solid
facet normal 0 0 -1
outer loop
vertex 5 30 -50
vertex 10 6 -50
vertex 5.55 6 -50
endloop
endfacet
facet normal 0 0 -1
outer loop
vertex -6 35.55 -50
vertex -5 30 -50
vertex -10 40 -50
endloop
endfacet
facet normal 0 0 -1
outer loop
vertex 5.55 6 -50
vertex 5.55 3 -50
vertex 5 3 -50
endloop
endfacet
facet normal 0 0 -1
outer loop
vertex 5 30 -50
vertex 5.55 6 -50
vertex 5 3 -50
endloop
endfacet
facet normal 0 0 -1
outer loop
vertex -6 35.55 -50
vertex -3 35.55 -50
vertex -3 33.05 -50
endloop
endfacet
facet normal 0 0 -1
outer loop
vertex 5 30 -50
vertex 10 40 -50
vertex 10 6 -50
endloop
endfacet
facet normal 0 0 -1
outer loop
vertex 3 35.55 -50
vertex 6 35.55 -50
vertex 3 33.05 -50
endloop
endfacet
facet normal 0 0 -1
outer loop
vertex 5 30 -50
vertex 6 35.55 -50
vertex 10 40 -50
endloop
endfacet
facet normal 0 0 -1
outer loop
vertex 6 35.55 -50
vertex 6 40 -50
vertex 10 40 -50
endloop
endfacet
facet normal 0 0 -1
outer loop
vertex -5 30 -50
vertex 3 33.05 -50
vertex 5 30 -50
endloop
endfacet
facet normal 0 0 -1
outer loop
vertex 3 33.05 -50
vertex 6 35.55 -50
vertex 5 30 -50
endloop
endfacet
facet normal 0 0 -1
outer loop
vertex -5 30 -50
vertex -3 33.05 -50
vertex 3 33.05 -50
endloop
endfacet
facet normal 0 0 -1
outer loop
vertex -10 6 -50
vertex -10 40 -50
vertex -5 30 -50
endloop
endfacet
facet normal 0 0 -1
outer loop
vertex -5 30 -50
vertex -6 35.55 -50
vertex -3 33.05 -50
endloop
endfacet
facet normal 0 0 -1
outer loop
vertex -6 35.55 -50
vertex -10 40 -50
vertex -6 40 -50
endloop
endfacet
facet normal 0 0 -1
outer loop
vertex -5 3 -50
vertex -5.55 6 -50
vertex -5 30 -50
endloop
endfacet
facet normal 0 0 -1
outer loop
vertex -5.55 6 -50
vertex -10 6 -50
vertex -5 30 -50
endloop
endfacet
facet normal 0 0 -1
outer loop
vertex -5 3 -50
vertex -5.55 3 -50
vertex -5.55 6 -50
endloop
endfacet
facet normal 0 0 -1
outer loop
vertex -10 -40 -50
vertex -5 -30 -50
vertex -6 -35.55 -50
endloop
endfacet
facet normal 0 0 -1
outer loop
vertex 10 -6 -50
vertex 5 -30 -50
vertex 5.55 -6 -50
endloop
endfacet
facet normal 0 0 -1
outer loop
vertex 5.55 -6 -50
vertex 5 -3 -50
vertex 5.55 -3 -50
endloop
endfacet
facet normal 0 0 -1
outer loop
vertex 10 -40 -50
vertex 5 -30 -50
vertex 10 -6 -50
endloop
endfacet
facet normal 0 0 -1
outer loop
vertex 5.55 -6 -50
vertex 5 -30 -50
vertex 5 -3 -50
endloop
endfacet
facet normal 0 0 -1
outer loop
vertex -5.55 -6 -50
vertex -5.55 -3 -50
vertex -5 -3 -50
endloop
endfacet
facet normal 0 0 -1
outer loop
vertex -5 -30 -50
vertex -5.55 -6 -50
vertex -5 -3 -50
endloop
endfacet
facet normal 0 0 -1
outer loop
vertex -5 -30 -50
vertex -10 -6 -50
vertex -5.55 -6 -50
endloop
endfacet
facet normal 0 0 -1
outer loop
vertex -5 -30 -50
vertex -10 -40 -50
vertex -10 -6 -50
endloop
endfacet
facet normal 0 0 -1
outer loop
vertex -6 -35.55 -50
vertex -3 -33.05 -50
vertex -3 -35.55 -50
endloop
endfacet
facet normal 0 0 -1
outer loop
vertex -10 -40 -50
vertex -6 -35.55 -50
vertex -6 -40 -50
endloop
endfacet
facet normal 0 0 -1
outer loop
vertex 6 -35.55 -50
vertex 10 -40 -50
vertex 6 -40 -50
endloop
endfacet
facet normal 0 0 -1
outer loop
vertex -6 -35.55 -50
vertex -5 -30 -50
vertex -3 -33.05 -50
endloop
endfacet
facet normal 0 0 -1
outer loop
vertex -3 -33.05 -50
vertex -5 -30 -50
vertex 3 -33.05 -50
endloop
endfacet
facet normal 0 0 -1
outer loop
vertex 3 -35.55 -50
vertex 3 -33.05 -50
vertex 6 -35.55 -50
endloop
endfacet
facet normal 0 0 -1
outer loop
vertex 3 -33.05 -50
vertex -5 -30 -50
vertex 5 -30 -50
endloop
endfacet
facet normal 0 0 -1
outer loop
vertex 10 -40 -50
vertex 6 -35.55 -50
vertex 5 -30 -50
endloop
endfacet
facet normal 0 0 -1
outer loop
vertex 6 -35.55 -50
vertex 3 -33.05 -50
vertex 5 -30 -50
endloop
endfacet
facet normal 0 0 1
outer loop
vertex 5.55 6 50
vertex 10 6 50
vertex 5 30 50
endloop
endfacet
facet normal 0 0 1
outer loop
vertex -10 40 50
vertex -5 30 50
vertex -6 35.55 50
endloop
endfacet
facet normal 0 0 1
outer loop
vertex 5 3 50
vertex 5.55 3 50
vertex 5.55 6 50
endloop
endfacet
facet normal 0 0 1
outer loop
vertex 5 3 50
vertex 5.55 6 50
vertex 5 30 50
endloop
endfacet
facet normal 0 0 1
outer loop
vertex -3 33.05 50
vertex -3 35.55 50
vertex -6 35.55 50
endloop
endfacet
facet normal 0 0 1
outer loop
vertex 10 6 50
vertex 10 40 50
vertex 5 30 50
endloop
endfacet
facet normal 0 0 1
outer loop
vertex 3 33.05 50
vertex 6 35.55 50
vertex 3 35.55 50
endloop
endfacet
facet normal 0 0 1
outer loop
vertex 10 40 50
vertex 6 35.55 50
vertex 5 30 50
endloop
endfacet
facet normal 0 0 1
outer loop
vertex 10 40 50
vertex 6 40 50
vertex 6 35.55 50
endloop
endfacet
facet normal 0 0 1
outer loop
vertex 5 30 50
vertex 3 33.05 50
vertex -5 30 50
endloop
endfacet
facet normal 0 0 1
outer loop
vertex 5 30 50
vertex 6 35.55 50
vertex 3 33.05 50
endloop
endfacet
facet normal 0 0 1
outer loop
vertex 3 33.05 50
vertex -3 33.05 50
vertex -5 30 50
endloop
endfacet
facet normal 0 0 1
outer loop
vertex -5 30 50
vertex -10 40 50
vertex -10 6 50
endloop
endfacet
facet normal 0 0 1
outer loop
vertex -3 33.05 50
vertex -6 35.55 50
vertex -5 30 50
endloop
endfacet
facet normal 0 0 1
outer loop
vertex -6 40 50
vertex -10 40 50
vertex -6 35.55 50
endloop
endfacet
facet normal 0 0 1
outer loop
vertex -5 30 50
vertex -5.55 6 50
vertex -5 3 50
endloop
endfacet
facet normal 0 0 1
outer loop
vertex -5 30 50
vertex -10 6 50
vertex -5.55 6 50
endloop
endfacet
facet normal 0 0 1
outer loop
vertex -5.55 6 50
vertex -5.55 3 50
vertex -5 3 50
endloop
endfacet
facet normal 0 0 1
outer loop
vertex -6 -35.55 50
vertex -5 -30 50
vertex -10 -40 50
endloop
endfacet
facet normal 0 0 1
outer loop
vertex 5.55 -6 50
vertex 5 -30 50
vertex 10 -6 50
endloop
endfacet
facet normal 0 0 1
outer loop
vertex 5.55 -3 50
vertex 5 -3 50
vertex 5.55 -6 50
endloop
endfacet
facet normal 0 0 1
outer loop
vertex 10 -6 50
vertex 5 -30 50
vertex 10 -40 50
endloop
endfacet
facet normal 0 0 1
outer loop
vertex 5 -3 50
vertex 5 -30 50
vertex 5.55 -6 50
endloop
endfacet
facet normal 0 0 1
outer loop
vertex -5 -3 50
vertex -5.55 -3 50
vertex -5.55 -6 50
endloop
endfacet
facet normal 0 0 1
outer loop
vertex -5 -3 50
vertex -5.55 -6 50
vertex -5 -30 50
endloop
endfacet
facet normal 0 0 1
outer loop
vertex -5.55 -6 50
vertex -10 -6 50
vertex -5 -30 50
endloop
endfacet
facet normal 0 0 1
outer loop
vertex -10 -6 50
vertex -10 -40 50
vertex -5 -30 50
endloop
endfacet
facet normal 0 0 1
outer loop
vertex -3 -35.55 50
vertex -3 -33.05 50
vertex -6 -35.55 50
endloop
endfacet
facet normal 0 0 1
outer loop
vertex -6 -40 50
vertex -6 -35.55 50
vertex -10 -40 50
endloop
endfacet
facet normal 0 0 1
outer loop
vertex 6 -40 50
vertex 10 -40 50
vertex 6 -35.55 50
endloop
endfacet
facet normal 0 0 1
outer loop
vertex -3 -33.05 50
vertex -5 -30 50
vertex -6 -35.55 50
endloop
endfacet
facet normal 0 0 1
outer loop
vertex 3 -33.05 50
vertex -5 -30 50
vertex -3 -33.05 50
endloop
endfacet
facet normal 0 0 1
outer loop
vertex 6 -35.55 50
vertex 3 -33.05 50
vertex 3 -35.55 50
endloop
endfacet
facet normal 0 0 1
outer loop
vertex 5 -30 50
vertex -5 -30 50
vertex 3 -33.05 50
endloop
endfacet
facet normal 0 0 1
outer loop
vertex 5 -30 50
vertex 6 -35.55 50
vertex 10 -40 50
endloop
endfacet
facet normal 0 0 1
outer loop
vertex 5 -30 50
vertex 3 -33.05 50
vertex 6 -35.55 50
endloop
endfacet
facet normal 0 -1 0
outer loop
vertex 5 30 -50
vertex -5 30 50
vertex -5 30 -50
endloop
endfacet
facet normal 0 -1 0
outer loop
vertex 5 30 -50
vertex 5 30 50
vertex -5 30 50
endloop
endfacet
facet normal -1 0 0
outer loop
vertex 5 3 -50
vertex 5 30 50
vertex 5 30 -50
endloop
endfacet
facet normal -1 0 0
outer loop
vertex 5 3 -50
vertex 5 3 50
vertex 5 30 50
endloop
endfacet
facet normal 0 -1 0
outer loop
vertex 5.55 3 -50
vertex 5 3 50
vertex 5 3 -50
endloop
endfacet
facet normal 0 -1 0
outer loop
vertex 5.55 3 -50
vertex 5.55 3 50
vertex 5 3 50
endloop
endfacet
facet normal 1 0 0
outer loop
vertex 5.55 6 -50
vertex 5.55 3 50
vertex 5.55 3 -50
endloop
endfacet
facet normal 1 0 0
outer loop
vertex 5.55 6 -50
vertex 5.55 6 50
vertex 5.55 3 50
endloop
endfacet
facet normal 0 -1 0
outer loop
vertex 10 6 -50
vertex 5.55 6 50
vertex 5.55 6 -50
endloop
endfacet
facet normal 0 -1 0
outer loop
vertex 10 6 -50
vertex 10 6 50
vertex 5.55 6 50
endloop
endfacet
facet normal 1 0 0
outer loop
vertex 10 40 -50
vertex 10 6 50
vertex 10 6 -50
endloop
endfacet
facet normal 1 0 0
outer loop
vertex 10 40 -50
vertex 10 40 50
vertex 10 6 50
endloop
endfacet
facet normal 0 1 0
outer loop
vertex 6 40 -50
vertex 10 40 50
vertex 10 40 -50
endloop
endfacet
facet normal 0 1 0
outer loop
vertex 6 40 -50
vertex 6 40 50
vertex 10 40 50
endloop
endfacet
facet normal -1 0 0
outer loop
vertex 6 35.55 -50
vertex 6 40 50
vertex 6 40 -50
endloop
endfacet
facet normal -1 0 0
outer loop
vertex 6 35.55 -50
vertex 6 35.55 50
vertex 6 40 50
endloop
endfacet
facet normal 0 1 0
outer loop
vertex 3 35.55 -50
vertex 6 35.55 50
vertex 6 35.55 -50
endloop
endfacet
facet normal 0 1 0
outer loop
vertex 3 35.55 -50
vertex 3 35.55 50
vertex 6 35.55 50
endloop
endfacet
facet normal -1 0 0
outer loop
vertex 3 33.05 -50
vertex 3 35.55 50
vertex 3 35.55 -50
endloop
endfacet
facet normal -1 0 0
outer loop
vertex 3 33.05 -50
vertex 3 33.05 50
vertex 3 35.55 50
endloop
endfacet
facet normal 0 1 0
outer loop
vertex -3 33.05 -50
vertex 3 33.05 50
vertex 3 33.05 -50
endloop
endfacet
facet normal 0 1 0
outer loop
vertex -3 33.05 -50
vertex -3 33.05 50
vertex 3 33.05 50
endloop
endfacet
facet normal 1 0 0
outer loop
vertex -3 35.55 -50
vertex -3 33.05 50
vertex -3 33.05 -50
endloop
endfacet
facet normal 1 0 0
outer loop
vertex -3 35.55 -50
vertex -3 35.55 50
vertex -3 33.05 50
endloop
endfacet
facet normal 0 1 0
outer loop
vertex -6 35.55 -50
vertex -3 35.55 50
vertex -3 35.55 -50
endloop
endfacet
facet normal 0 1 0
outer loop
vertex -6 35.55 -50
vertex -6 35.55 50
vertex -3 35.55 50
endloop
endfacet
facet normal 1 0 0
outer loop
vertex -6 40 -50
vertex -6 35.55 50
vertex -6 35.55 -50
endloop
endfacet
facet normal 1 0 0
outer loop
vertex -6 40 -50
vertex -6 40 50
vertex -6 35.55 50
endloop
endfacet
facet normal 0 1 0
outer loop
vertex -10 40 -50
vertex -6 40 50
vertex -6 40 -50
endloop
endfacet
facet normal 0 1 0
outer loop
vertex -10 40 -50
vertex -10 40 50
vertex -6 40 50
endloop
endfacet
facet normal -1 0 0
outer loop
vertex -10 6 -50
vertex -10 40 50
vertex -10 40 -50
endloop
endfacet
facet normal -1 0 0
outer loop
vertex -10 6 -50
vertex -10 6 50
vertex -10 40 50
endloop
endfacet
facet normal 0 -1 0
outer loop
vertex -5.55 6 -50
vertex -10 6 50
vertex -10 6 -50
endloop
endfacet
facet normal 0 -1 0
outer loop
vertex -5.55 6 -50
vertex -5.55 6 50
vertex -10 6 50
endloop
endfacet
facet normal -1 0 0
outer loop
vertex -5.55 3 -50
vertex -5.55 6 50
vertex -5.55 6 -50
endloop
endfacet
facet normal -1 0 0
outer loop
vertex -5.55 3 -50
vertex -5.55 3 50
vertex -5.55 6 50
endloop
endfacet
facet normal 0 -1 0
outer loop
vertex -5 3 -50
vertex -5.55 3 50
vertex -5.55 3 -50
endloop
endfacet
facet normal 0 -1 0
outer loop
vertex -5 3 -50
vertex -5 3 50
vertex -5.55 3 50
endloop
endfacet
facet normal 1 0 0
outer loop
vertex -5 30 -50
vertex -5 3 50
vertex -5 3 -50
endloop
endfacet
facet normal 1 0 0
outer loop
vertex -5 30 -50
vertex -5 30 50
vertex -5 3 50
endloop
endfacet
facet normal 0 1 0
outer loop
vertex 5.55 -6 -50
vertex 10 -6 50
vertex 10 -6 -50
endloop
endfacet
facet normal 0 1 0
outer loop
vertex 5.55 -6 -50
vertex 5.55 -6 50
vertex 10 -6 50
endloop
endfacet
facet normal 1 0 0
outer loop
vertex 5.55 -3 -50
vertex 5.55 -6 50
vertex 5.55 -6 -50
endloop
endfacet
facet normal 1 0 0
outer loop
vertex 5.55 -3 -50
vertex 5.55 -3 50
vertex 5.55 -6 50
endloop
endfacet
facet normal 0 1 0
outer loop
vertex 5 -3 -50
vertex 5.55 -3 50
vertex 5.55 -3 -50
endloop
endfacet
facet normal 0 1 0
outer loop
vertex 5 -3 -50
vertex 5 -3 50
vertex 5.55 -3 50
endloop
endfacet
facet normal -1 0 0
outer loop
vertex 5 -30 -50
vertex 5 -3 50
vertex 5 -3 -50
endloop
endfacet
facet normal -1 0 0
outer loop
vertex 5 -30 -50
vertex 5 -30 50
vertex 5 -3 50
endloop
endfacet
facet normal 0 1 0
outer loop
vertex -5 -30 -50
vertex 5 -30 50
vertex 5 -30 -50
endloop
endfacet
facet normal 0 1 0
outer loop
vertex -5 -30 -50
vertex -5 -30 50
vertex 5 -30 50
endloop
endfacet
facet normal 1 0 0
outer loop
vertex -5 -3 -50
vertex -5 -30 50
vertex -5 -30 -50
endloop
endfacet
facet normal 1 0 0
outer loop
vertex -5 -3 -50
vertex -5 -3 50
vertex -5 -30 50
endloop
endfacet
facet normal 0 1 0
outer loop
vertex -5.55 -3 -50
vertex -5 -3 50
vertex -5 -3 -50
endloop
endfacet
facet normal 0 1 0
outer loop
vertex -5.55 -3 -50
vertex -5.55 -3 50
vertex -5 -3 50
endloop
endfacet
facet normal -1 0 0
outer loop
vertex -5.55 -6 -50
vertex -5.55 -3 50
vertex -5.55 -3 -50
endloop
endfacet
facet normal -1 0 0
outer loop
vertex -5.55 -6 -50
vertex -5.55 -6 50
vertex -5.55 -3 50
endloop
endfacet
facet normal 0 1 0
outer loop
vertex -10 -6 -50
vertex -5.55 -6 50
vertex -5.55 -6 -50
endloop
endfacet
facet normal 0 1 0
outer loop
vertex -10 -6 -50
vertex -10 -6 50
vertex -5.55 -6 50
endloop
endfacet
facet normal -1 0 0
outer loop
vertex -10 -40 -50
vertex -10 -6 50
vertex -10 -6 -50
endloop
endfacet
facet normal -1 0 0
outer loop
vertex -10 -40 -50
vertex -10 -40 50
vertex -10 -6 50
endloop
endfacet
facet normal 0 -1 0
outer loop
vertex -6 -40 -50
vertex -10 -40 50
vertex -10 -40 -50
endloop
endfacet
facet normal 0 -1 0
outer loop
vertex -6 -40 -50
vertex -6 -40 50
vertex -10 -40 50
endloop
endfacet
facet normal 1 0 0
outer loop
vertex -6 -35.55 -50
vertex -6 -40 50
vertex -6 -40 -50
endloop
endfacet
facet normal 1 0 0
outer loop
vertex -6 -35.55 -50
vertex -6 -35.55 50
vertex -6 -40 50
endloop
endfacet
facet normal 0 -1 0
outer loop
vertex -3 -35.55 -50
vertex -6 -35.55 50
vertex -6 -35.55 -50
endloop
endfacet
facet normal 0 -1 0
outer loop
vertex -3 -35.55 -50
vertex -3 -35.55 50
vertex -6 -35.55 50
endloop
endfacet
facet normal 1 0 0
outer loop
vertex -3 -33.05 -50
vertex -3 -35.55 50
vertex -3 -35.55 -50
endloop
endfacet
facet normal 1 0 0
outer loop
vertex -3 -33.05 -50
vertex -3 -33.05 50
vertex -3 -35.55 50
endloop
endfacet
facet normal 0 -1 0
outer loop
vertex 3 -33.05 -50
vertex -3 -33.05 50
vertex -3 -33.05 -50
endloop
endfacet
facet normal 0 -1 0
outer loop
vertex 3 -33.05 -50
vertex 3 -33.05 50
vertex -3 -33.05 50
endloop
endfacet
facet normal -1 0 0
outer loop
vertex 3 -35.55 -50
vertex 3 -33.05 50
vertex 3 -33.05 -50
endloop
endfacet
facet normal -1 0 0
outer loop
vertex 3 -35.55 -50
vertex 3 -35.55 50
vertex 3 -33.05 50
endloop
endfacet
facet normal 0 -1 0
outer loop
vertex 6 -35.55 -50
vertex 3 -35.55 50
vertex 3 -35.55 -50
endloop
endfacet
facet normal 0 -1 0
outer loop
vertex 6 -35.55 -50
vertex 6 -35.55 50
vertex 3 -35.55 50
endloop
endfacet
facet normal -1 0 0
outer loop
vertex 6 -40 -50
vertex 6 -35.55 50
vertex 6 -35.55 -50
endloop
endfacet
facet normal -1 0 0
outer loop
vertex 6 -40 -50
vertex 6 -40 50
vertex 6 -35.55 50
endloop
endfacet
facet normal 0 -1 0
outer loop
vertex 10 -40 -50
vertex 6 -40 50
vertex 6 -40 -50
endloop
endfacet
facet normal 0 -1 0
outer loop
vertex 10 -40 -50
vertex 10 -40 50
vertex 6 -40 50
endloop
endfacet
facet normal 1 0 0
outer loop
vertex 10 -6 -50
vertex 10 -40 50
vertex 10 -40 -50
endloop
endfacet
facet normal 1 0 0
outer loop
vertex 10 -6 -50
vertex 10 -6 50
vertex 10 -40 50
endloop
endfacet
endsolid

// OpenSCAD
// 20x80 aluminium extrusion profile (T-slot style), 100mm long
// One connected solid with visible side T-slots and an internal cavity.

$fn = 64;

// Overall dimensions
profile_W = 20.0;   // X (mm)
profile_H = 80.0;   // Y (mm)
length_L  = 100.0;  // Z (mm)

// Feature dimensions (kept conservative to ensure a connected shell)
wall_t        = 2.0;   // outer wall thickness
slot_open_w   = 6.0;   // slot mouth width at surface
slot_depth    = 2.5;   // depth of narrow mouth section
slot_inner_w  = 12.0;  // inner pocket width
slot_inner_d  = 7.0;   // total depth from surface to end of pocket

core_void_w   = 10.0;  // central void width
core_void_h   = 60.0;  // central void height

eps = 0.05;

// 2D cut shape for one T-slot, defined pointing outward along +X.
// IMPORTANT: It starts at x=0 (surface) and extends inward to +x.
module tslot_cut_2d() {
    polygon(points=[
        [0,            -slot_open_w/2],
        [slot_depth,   -slot_open_w/2],
        [slot_depth,   -slot_inner_w/2],
        [slot_inner_d, -slot_inner_w/2],
        [slot_inner_d,  slot_inner_w/2],
        [slot_depth,    slot_inner_w/2],
        [slot_depth,    slot_open_w/2],
        [0,             slot_open_w/2]
    ]);
}

// 2D cross-section of the extrusion
module extrusion_profile_2d() {
    difference() {
        // Outer boundary
        square([profile_W, profile_H], center=true);

        // Central cavity (keeps a connected shell)
        square([core_void_w, core_void_h], center=true);

        // Side T-slots: place the cut so its x=0 edge lies on the outer surface.
        // Right (+X): surface at x = +profile_W/2
        translate([profile_W/2 - slot_inner_d + eps, 0])
            tslot_cut_2d();

        // Left (-X): mirror and place on x = -profile_W/2
        mirror([1,0,0])
            translate([profile_W/2 - slot_inner_d + eps, 0])
                tslot_cut_2d();

        // Top (+Y): rotate so it points outward along +Y, then place on y = +profile_H/2
        rotate(90)
            translate([profile_H/2 - slot_inner_d + eps, 0])
                tslot_cut_2d();

        // Bottom (-Y)
        rotate(90)
            mirror([1,0,0])
                translate([profile_H/2 - slot_inner_d + eps, 0])
                    tslot_cut_2d();
    }
}

// 3D extrusion
color("Silver")
linear_extrude(height=length_L, center=true, convexity=10)
    extrusion_profile_2d();
